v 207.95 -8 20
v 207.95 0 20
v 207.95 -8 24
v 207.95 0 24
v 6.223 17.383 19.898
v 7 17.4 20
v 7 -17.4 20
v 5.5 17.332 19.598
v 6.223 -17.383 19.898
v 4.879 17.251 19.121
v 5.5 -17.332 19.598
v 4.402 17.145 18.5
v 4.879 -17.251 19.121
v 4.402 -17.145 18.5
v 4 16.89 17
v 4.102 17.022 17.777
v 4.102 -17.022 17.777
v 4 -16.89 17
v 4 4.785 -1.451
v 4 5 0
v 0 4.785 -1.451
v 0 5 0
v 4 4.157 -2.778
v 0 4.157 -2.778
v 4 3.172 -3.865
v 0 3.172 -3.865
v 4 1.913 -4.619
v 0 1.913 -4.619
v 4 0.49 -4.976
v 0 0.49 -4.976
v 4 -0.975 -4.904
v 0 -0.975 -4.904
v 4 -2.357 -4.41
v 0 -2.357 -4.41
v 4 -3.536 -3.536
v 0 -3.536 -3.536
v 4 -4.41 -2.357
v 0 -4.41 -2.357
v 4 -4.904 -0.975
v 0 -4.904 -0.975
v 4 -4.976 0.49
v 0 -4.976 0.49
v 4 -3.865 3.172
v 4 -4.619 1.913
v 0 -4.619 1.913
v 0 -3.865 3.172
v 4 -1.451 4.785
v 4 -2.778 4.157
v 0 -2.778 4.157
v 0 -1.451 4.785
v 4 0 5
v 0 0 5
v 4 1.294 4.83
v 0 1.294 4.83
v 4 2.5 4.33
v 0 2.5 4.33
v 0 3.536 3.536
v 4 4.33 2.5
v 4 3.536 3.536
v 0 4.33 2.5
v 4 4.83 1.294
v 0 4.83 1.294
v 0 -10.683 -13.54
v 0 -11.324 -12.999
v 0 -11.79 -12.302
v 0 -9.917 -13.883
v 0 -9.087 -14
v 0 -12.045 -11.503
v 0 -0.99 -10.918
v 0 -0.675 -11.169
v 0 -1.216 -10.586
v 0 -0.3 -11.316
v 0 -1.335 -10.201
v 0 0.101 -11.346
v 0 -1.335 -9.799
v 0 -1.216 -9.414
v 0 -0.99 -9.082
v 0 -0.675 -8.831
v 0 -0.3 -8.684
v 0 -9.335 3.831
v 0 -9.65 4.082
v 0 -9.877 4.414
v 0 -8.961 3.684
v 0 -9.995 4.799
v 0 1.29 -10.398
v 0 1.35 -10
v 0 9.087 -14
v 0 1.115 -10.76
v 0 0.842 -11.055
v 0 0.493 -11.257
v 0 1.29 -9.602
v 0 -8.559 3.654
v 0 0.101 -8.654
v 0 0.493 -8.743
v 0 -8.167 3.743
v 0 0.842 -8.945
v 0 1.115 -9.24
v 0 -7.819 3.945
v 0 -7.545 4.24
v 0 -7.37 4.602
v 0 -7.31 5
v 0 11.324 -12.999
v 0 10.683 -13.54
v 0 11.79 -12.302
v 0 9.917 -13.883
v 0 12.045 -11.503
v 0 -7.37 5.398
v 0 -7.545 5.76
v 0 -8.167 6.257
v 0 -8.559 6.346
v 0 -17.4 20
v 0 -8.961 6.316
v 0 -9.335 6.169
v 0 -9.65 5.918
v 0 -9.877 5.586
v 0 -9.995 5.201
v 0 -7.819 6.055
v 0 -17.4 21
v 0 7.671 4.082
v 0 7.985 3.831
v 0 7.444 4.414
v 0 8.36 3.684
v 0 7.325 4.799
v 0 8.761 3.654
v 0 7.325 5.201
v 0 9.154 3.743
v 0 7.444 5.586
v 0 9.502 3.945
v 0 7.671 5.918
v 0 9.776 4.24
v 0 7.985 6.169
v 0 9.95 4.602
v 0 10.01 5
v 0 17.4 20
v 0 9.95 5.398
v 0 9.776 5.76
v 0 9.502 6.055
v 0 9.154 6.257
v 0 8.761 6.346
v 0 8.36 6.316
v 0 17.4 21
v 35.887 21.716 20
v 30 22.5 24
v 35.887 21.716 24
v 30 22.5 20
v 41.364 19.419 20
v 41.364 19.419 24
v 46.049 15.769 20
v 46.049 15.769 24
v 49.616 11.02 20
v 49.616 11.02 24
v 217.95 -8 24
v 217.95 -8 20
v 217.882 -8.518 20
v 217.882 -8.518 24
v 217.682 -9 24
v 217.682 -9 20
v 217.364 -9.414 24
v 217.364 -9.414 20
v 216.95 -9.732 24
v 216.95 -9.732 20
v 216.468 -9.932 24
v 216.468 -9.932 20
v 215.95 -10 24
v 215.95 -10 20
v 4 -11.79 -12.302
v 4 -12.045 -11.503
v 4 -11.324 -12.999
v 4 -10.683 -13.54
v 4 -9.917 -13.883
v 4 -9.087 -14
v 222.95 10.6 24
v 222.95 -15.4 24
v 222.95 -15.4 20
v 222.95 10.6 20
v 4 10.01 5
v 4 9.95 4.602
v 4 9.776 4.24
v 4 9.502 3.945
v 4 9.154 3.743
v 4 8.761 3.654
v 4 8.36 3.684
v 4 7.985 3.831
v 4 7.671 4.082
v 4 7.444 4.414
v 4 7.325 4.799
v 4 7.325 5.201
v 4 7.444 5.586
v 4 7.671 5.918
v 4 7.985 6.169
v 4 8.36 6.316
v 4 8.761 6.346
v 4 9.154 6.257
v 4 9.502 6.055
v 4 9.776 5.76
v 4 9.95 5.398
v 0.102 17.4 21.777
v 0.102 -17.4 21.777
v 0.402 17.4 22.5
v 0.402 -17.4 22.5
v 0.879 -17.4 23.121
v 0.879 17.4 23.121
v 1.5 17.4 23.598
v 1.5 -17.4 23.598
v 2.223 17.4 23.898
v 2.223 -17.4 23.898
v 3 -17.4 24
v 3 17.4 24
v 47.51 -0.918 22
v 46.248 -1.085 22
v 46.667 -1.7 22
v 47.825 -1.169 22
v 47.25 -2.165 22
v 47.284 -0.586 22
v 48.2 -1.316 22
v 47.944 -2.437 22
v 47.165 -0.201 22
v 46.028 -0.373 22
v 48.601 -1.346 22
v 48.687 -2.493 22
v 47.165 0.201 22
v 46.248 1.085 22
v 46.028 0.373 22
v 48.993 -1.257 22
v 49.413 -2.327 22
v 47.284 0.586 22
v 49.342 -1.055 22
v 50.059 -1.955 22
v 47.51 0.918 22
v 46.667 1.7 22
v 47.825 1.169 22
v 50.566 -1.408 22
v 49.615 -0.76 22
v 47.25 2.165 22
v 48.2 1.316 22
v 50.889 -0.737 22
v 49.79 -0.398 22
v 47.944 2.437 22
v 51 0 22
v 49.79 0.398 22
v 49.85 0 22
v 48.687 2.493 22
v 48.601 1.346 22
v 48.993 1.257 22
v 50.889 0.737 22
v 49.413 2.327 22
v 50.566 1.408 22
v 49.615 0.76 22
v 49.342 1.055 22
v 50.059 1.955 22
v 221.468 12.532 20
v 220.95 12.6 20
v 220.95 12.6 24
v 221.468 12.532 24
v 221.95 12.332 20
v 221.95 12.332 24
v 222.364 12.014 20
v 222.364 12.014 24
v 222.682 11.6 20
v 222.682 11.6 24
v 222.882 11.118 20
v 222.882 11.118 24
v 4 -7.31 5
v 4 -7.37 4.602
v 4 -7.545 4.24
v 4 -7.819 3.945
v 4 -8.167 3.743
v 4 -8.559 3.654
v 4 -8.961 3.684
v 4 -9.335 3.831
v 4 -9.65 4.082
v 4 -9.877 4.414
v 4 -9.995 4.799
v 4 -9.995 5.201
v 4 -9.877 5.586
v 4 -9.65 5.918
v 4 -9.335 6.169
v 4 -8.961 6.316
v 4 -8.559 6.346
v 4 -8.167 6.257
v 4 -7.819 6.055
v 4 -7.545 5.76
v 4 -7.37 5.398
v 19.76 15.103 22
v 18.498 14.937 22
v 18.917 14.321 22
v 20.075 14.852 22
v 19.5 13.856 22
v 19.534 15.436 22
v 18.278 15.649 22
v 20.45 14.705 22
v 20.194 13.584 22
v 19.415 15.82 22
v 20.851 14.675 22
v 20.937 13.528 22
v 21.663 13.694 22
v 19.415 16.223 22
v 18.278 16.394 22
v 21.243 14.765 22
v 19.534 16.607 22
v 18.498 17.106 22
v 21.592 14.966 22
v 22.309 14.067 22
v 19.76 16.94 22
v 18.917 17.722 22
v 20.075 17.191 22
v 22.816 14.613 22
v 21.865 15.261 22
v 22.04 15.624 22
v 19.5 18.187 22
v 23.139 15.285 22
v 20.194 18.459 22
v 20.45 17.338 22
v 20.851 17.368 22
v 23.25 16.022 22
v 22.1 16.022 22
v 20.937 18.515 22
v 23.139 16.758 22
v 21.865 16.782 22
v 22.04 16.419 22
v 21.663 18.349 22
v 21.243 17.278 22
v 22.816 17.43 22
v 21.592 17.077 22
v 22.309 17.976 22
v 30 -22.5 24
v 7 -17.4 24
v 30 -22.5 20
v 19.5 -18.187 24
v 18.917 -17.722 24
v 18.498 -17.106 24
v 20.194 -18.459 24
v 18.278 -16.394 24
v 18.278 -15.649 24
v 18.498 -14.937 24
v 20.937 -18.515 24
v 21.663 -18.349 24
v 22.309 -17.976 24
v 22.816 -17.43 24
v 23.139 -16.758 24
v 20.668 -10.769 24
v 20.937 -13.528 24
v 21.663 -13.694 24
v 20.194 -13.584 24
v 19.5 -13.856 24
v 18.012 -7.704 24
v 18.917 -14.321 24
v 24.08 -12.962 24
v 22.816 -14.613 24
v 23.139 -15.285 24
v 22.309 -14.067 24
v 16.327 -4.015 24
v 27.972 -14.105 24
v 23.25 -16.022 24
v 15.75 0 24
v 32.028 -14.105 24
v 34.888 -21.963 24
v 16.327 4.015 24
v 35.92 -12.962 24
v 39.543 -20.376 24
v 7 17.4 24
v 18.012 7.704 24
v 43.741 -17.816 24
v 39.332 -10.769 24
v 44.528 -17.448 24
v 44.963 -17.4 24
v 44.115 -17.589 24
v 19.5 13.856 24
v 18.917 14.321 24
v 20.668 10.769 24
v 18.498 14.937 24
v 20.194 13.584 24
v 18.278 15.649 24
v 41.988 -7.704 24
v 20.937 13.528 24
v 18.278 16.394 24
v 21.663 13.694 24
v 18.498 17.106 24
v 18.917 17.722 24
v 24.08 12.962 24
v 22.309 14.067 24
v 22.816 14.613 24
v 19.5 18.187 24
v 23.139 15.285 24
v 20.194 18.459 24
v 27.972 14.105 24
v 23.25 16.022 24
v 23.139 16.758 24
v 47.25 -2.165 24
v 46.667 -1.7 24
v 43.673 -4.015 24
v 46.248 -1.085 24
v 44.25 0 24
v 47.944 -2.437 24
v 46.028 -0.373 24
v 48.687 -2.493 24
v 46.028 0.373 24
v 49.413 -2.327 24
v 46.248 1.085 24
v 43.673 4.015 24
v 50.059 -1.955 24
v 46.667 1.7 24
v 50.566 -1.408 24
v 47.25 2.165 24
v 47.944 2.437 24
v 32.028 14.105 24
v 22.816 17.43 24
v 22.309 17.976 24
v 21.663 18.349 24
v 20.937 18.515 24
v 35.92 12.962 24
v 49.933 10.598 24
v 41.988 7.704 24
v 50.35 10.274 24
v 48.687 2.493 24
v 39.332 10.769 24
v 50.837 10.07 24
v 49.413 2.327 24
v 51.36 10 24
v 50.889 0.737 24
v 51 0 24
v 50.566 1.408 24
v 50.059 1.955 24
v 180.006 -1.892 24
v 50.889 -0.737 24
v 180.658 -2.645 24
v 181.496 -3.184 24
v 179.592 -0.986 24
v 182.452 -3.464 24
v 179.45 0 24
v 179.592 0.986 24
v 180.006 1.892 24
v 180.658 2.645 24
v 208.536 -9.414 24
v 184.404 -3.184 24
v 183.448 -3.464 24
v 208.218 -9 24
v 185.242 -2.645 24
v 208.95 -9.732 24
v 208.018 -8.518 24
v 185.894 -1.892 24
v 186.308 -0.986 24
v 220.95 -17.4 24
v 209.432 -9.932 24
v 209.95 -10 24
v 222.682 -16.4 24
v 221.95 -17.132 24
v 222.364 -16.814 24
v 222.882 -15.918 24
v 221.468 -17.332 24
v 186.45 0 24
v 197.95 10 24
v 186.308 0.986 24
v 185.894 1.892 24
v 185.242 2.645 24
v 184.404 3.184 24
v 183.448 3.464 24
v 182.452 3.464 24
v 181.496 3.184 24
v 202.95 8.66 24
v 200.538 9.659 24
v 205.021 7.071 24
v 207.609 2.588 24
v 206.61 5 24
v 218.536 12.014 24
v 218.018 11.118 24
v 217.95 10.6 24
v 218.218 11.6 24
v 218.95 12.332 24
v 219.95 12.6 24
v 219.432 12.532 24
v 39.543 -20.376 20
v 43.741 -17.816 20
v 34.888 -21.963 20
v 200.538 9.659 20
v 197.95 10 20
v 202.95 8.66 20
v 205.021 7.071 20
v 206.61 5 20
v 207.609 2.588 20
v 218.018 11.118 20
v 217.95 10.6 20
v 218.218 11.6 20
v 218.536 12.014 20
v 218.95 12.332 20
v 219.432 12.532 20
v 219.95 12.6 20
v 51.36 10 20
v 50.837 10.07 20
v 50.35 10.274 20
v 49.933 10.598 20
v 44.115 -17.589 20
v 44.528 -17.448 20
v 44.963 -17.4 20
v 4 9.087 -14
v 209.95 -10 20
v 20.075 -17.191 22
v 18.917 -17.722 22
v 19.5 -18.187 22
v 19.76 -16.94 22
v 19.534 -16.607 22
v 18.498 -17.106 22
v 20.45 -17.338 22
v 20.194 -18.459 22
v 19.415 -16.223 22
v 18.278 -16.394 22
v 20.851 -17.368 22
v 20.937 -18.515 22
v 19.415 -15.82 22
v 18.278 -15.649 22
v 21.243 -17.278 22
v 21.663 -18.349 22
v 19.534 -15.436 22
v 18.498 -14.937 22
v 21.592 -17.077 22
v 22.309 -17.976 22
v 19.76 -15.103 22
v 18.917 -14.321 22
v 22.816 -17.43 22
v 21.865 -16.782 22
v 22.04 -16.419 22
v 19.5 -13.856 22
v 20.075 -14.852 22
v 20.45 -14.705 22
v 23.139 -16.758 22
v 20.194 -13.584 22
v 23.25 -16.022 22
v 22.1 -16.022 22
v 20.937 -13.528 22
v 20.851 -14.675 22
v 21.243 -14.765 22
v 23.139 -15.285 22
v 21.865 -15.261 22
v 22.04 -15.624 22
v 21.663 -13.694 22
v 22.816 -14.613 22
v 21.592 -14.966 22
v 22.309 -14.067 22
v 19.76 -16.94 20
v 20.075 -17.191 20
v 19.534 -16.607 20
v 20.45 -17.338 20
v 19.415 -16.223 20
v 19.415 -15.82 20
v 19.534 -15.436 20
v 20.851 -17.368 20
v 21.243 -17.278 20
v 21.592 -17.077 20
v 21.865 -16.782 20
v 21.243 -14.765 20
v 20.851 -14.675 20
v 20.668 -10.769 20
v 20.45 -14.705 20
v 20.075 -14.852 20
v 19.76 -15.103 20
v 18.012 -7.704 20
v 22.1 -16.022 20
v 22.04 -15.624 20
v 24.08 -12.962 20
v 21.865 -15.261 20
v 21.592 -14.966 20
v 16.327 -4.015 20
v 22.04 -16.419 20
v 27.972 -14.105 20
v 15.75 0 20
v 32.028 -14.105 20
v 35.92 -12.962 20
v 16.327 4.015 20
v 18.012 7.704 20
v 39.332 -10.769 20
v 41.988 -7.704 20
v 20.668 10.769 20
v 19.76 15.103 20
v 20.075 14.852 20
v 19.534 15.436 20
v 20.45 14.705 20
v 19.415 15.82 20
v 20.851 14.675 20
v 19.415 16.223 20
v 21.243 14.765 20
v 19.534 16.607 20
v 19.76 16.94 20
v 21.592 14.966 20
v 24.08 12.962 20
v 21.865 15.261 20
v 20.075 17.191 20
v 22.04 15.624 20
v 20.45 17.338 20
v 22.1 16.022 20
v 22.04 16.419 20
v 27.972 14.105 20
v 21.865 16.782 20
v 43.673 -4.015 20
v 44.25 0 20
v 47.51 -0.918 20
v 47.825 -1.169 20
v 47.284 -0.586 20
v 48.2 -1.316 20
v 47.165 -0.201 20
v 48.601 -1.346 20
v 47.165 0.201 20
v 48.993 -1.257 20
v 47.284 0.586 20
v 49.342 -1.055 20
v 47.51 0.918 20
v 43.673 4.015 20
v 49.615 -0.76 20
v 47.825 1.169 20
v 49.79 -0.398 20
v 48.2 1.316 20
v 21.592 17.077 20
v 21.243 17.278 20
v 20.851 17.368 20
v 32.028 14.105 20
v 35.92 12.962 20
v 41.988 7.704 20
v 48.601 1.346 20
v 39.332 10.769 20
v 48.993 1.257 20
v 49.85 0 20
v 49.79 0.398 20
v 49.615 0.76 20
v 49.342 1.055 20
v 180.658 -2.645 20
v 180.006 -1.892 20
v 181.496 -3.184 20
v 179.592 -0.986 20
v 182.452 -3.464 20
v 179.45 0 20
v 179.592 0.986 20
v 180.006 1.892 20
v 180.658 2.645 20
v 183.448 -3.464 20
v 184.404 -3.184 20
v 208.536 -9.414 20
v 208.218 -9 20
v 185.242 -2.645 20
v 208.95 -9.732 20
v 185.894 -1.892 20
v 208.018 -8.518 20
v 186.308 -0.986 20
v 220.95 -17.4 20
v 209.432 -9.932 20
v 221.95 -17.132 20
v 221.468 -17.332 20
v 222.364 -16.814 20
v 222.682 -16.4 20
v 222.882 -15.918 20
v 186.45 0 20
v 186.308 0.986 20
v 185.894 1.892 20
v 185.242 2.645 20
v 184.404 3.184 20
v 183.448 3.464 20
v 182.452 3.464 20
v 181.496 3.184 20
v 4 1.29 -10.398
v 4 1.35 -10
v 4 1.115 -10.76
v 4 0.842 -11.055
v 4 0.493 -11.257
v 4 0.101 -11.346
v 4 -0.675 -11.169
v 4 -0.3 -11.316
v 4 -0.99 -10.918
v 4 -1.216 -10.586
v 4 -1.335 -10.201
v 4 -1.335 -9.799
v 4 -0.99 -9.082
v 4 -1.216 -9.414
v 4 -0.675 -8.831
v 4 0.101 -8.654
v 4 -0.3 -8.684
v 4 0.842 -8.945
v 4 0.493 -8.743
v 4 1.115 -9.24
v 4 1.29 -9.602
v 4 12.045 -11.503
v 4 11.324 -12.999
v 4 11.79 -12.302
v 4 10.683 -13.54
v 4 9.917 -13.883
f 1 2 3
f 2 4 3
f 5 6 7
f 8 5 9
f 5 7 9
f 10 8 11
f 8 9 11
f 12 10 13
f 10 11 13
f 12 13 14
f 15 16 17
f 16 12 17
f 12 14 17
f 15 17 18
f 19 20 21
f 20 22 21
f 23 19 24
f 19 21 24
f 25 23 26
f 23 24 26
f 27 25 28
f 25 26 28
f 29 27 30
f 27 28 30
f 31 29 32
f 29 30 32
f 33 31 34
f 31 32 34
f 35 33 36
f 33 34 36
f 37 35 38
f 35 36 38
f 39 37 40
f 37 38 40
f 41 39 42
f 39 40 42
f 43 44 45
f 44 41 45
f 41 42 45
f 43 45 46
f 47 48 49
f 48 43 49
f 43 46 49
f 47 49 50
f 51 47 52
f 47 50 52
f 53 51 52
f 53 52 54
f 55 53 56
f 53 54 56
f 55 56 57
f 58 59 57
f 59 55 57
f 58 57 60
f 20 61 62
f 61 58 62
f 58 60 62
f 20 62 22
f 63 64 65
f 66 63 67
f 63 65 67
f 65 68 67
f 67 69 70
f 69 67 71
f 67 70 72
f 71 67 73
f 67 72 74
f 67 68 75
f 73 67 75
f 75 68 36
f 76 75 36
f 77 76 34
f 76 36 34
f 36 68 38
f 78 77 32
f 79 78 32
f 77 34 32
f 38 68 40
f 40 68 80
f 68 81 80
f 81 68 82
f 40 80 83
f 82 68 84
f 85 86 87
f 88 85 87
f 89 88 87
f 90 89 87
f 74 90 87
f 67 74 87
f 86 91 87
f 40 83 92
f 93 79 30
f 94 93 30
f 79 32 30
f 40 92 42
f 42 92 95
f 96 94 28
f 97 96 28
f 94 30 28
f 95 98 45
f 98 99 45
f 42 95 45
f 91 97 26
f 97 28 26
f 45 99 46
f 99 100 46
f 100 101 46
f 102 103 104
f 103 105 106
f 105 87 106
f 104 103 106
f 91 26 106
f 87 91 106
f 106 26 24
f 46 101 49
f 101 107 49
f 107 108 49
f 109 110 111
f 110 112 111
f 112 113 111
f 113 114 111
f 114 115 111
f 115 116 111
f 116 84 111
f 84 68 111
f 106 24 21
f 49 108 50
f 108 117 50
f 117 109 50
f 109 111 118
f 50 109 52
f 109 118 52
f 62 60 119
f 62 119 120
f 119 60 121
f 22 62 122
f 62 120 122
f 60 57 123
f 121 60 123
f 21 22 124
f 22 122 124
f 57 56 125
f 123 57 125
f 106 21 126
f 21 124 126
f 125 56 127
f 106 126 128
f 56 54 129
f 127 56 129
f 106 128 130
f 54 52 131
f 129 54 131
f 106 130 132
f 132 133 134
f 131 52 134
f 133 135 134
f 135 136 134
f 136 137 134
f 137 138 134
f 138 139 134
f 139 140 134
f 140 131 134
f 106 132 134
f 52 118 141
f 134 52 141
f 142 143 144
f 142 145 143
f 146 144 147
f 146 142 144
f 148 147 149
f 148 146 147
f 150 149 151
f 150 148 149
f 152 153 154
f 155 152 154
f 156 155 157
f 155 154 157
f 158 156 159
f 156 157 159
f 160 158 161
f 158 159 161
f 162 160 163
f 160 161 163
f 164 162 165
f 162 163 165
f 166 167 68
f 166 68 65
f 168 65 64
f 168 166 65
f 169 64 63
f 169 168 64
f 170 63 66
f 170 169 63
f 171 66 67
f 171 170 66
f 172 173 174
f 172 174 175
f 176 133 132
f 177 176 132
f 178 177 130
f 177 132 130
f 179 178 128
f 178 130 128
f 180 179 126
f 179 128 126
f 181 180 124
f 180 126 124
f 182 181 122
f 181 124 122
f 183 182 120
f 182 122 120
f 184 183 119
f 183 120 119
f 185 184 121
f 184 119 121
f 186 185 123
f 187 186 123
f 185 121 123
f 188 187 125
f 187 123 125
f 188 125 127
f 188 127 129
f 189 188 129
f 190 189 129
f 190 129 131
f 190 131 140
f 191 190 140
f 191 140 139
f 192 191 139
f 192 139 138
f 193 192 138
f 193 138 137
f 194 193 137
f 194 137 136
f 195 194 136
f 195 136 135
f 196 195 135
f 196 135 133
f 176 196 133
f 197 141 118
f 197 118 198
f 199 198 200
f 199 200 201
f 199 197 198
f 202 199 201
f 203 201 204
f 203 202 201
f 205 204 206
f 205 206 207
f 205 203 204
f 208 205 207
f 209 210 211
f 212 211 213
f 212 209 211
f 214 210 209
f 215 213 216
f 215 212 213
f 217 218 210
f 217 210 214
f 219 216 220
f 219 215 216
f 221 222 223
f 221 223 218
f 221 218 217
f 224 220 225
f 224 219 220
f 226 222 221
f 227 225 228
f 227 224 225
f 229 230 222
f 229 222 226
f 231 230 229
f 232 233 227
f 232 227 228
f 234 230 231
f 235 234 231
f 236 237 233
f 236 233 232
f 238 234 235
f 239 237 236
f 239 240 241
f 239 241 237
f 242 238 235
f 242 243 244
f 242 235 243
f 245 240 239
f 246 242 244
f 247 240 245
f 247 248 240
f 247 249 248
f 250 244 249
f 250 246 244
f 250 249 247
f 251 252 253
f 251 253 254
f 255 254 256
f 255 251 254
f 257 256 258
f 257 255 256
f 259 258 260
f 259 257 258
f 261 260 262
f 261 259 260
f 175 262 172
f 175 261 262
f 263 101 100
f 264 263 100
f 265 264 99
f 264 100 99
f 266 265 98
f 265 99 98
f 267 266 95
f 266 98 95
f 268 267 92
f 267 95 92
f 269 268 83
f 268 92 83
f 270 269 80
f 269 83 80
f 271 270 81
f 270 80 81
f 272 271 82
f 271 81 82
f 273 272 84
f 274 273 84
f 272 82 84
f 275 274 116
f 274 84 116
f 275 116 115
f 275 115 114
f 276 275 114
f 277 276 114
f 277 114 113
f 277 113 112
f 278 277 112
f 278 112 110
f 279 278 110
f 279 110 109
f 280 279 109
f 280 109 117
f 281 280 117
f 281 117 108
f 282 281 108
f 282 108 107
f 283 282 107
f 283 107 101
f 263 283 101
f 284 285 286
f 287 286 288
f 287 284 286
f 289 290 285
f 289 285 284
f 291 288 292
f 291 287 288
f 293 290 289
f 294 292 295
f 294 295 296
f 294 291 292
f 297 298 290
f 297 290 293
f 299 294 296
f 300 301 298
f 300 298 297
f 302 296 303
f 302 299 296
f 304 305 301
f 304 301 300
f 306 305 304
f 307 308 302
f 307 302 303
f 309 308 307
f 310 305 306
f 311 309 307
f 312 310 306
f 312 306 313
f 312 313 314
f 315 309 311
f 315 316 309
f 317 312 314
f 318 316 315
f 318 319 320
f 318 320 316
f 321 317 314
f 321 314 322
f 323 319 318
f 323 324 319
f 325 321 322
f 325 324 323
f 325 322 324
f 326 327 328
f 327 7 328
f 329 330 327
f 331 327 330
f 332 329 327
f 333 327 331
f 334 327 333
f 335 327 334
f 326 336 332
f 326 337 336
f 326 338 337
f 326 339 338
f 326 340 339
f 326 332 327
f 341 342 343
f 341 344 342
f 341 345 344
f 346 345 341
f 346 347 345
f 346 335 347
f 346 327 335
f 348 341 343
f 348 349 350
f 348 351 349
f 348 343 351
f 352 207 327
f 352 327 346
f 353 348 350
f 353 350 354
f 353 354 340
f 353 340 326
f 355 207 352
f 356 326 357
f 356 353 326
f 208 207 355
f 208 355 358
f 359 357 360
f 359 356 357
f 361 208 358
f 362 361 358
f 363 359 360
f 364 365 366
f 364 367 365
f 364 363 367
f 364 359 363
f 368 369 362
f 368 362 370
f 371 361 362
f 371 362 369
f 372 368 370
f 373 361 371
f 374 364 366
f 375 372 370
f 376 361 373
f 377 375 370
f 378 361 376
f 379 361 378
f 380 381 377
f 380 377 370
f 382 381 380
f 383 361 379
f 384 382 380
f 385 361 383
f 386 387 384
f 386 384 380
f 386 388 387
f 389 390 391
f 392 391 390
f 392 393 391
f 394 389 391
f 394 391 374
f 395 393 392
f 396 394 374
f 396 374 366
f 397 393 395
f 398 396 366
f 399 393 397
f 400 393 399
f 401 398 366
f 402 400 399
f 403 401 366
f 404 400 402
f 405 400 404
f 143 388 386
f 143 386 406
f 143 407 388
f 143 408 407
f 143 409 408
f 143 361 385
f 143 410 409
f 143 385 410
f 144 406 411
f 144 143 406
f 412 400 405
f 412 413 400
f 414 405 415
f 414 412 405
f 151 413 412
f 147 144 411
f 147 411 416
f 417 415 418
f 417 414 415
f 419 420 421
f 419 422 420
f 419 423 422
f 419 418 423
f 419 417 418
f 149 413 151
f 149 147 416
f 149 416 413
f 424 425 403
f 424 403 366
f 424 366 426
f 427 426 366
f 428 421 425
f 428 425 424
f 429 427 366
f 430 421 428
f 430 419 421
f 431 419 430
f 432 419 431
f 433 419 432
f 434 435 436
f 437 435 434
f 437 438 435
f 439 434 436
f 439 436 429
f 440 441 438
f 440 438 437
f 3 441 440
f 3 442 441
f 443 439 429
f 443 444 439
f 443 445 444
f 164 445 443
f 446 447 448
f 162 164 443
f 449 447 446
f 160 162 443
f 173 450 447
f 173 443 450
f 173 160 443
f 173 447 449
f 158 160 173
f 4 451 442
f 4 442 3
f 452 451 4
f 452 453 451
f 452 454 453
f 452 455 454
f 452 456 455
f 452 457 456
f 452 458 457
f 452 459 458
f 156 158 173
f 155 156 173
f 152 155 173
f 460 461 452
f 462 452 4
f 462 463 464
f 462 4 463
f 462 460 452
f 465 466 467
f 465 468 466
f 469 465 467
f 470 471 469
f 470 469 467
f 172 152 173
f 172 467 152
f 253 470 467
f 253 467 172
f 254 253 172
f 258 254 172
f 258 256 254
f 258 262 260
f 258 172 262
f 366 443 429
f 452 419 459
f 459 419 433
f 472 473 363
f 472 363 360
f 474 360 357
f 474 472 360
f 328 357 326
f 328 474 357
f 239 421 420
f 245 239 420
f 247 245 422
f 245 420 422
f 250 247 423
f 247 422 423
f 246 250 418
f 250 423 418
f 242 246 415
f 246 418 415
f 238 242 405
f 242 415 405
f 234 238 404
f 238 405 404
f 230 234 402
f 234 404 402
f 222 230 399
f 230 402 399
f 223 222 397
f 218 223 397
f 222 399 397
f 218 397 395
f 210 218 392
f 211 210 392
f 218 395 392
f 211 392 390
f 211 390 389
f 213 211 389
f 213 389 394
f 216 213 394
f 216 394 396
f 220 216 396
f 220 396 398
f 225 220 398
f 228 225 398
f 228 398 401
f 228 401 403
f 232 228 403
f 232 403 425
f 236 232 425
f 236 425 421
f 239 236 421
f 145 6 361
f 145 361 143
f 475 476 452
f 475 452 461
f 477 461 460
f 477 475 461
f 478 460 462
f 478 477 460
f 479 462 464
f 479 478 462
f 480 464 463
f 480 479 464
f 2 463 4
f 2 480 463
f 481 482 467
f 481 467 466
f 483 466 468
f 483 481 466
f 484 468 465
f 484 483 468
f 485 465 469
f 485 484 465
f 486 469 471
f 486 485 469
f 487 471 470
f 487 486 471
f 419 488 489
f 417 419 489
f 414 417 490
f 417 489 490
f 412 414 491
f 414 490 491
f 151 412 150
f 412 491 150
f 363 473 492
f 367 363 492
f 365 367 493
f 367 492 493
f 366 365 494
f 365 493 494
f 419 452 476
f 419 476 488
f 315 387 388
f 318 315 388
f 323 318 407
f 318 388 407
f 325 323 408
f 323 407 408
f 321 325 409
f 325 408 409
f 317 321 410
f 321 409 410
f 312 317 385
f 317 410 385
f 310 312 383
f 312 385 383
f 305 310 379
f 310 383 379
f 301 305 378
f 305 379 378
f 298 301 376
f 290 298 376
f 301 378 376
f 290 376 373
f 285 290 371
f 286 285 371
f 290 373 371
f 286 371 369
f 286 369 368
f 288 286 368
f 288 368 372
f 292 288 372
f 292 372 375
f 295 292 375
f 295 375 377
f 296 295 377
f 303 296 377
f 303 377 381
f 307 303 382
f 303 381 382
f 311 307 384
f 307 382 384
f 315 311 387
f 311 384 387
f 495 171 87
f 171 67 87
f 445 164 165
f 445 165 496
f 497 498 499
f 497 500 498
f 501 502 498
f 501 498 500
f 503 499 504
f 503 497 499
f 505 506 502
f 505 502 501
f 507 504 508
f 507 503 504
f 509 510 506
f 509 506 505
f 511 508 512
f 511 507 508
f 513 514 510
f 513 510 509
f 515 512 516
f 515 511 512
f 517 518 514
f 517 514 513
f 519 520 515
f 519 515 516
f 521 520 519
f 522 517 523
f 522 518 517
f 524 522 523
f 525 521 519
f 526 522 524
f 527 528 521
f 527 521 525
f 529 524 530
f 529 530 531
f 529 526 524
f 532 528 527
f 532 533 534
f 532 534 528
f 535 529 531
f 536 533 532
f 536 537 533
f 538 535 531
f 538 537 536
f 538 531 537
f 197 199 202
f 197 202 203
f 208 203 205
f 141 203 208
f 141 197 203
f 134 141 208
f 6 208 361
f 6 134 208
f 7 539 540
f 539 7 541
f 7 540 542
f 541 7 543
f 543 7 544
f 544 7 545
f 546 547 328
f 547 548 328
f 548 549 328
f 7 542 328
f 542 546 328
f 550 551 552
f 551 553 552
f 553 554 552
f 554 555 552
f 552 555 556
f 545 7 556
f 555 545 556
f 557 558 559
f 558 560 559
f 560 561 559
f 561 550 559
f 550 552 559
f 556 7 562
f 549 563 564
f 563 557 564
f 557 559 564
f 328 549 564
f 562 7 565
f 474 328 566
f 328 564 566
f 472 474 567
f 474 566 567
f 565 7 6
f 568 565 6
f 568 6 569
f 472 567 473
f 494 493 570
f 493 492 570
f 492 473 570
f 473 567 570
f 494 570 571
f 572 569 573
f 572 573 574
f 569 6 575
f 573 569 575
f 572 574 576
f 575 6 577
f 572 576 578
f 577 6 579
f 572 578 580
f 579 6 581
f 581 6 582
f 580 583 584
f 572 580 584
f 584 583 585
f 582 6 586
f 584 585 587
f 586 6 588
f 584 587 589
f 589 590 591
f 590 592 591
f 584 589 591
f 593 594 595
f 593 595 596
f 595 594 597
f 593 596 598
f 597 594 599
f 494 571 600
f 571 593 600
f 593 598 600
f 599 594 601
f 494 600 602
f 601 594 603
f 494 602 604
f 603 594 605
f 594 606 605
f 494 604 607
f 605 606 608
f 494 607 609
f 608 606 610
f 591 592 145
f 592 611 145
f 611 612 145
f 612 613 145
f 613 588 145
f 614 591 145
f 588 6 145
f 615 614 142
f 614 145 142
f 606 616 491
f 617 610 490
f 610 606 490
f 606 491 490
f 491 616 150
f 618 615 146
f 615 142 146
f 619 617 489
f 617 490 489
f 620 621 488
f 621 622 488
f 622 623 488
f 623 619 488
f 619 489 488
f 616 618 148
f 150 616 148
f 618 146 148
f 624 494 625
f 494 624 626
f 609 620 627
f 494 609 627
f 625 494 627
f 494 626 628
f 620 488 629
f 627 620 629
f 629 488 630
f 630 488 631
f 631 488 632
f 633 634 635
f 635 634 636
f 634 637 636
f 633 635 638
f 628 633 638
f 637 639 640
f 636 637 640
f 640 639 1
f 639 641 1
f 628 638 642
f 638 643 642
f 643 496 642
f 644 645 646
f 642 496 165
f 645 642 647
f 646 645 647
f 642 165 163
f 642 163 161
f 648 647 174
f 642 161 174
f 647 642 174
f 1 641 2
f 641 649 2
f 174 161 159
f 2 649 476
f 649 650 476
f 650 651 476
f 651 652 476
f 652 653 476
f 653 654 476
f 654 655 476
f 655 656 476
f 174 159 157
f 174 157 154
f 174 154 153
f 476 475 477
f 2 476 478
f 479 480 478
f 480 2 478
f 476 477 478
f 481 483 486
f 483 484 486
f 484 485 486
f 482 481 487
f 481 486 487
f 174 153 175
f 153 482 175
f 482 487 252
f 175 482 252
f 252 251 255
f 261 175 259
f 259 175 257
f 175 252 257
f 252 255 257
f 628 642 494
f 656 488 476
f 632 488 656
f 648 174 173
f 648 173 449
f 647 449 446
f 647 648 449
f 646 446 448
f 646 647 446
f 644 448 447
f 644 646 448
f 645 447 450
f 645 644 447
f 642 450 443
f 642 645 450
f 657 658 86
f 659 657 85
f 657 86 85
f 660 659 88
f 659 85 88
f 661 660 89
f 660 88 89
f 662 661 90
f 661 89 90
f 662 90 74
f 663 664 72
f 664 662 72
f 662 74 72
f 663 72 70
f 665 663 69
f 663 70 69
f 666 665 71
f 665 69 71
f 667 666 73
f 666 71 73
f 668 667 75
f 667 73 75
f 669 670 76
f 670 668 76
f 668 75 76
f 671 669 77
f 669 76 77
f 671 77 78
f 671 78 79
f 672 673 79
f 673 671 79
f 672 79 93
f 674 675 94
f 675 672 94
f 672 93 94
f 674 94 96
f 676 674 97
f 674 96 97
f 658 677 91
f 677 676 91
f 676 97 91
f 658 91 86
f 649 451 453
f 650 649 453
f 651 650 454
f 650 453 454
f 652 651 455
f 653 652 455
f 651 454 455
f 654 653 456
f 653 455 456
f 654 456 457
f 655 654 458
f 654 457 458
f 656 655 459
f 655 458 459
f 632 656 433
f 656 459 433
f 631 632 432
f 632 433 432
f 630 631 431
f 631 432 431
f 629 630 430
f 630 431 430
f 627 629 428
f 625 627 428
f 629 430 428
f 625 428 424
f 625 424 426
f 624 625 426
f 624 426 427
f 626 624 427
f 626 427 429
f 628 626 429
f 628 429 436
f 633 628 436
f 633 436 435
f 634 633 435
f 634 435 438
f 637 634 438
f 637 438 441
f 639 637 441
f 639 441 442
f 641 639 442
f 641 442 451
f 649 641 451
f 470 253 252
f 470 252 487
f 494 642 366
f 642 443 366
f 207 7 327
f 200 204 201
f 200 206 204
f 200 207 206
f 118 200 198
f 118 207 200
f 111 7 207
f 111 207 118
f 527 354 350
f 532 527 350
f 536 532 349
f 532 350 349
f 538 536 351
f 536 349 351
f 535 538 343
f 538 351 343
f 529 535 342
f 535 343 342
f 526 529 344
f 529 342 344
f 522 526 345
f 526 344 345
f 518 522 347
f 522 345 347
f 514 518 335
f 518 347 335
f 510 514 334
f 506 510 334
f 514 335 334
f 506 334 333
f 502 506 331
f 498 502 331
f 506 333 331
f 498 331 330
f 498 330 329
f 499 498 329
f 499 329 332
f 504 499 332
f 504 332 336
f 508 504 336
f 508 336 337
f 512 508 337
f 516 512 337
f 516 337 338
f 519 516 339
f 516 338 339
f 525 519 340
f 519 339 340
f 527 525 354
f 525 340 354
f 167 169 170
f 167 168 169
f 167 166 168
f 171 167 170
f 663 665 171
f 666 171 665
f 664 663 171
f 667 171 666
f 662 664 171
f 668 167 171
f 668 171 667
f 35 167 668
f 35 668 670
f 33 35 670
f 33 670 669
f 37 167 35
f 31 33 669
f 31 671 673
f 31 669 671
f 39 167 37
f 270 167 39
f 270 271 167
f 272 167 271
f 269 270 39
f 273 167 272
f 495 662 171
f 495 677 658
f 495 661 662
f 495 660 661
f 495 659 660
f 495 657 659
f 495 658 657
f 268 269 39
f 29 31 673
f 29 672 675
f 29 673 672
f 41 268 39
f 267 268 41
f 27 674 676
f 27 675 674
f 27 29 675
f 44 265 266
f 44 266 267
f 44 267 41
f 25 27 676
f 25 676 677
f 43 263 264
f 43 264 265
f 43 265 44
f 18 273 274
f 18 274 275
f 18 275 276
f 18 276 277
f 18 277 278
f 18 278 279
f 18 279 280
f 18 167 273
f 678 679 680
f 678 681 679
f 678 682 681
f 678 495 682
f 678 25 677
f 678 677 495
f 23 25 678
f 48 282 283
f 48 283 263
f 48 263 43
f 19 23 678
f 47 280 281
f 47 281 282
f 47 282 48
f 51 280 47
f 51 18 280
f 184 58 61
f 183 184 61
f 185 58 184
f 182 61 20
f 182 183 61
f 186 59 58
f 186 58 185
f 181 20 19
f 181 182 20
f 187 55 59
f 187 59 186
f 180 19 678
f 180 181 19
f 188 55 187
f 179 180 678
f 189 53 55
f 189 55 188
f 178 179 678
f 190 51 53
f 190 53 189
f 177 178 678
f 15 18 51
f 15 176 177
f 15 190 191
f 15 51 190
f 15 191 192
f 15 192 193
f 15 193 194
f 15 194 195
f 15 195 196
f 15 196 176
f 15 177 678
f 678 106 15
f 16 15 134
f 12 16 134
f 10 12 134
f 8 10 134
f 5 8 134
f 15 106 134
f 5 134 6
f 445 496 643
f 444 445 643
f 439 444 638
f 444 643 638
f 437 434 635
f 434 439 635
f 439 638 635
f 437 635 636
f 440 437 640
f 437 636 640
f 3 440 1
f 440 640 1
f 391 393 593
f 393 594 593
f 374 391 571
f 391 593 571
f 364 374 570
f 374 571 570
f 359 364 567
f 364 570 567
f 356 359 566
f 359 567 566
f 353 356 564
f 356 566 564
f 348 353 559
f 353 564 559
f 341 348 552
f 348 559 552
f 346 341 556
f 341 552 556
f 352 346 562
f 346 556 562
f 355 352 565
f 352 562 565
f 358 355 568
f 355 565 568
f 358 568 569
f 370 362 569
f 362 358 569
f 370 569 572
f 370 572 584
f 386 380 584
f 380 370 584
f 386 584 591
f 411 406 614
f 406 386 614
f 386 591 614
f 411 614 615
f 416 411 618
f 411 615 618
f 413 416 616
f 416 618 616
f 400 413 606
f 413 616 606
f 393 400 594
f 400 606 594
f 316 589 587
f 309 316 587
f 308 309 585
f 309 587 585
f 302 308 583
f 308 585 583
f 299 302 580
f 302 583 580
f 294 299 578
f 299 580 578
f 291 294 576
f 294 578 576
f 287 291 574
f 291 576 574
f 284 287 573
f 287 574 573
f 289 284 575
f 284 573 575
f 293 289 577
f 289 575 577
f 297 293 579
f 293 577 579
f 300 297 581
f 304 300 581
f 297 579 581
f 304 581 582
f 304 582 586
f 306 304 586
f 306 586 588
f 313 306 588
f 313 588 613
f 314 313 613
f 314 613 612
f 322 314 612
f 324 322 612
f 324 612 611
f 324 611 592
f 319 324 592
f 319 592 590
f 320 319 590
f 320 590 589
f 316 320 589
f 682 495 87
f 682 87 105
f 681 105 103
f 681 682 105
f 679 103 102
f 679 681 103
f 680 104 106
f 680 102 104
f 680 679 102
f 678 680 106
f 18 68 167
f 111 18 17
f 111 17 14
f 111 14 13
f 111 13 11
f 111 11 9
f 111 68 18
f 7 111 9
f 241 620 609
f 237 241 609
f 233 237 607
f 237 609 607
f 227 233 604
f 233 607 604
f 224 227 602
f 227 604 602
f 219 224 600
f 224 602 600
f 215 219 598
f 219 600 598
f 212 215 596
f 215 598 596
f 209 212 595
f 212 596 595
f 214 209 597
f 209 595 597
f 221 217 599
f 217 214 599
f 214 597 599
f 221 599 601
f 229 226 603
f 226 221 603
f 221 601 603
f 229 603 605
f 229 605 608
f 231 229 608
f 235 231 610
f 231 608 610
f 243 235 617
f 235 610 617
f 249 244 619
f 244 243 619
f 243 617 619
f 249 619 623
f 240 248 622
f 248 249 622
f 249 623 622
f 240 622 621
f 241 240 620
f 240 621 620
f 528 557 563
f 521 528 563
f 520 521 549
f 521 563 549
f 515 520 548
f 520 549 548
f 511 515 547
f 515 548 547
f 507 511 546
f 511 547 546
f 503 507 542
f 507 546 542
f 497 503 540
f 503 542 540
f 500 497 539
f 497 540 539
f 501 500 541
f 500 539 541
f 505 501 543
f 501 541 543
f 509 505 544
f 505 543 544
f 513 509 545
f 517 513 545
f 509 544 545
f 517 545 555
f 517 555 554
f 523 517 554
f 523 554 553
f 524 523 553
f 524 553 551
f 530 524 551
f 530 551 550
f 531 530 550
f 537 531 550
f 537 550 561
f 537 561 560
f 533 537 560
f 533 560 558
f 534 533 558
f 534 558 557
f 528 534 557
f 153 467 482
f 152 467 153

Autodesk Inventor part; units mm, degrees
ref_plane "YZ Plane" through (0, 0, 0) normal (1, 0, 0) x (0, 1, 0)
ref_plane "XZ Plane" through (0, 0, 0) normal (0, 1, 0) x (-1, 0, 0)
ref_plane "XY Plane" through (0, 0, 0) normal (0, 0, 1) x (1, 0, 0)
sketch "スケッチ1" plane through (0, 0, 0) normal (1, 0, 0) x (0, 1, 0)
  circle A0 centre (0, 0) radius 10
  circle A1 centre (0, -10) radius 1.35
  circle A2 centre (8.6603, 5) radius 1.35
  circle A3 centre (-8.6603, 5) radius 1.35
  circle A4 centre (0, 0) radius 5
  line L0 (0, 0) -> (0, 50)
  circle A5 centre (0, 50) radius 22.5
  circle A6 centre (0, 0) radius 14
  line L1 (-14, 0) -> (-22.5, 50)
  line L2 (14, 0) -> (22.5, 50)
  line L3 (0, -14) -> (-11.62, -14)
  line L4 (-11.62, -14) -> (-14, 0)
  line L5 (0, -14) -> (11.62, -14)
  line L6 (11.62, -14) -> (14, 0)
  line L7 (0, 20) -> (-17.4, 20)
  line L8 (0, 20) -> (17.4, 20)
  dimension "d0" = 20
  dimension "d1" = 2.7
  dimension "d4" = 360
  dimension "d6" = 10
  dimension "d7" = 50
  dimension "d8" = 45
  dimension "d9" = 28
extrude "押し出し1" add sketch "スケッチ1" along normal blind 4 contours A0 A1 A3 A2 | A6 L6 L4 | A6 L1 L7 L0 | L0 L8 L2 A6 | L6 L5 A6 | A6 L3 L4
sketch "スケッチ2" plane through (0, -17.4, 20) normal (0, 0, 1) x (1, 0, 0)
  line L0 (0, 17.4) -> (30, 17.4)
  circle A0 centre (30, 17.4) radius 22.5
  circle A1 centre (30, 17.4) radius 18.5
  circle A2 centre (30, 17.4) radius 14.25
  circle A3 centre (48.5, 17.4) radius 1.35
  circle A4 centre (20.75, 33.4215) radius 1.35
  circle A5 centre (20.75, 1.3785) radius 1.35
  line L1 (0, 29.02) -> (0, 34.8) projected
  line L2 (0, 0) -> (0, 5.78) projected
  line L3 (0, 34.8) -> (0, 0)
  line L4 (4, 29.02) -> (4, 34.8) projected
  line L5 (4, 34.8) -> (7, 34.8)
  line L6 (7, 34.8) -> (30, 39.9)
  line L7 (4, 0) -> (4, 5.78) projected
  line L8 (4, 0) -> (7, 0)
  line L9 (7, 0) -> (30, -5.1)
  line L10 (4, 0) -> (0, 0)
  line L11 (0, 34.8) -> (4, 34.8) projected
  line L12 (0, 0) -> (0, 34.8)
  line L13 (0, 34.8) -> (4, 34.8)
  dimension "d14" = 37
  dimension "d12" = 30
  dimension "d13" = 45
  dimension "d15" = 28.5
  dimension "d16" = 2.7
  dimension "d19" = 360
  dimension "d21" = 3
  dimension "d22" = 3
extrude "押し出し2" add sketch "スケッチ2" along normal blind 4 contours L3 L1 L11 L5 L6 A0 L0 | L0 A0 L9 L8 L10 L2 L3 | A1 A4 A3 A5 | A0 L6 L9
fillet "フィレット1" radius 3 2 edges at (4, 0, 20) (0, 0, 24)
fillet "フィレット2" radius 3 2 edges at (2, -11.62, -14) (2, 11.62, -14)
sketch "スケッチ7" plane through (0, -17.4, 24) normal (0, 0, 1) x (1, 0, 0)
  circle A0 centre (30, 17.4) radius 14.25 projected
  line L0 (30, 17.4) -> (182.95, 17.4)
  line L1 (30, 17.4) -> (182.95, 17.4) construction
  circle A1 centre (182.95, 17.4) radius 3.5
  circle A2 centre (182.95, 17.4) radius 10
  line L2 (182.95, 27.4) -> (50.1556, 27.4)
  arc A3 (30, -5.1) -> (30, 39.9) centre (30, 17.4) ccw projected
  line L3 (182.95, 27.4) -> (315.7444, 27.4) construction
  line L4 (182.95, 7.4) -> (50.1556, 7.4)
  point P0 (0, 17.4)
  dimension "d55" = 152.95
  dimension "d56" = 0
  dimension "d57" = 7
  dimension "d58" = 20
  dimension "d59" = 180
extrude "押し出し7" add sketch "スケッチ7" against normal blind 4 contours A3 L2 A2 L0 | L0 A2 L4 A3 | A2
sketch "スケッチ8" plane through (0, -17.4, 24) normal (0, 0, 1) x (1, 0, 0)
  circle A0 centre (20.75, 33.4215) radius 1.35 projected
  circle A1 centre (20.75, 33.4215) radius 2.5
  circle A2 centre (48.5, 17.4) radius 1.35 projected
  circle A3 centre (48.5, 17.4) radius 2.5
  circle A4 centre (20.75, 1.3785) radius 1.35 projected
  circle A5 centre (20.75, 1.3785) radius 2.5
  point P0 (0, 17.4)
  dimension "d63" = 5
  dimension "d64" = 5
  dimension "d65" = 5
extrude "押し出し8" cut sketch "スケッチ8" against normal blind 2 contours A0 | A1 | A3 | A4 | A5
fillet "フィレット4" radius 2 1 edges at (50.1556, 10, 22)
sketch "スケッチ10" plane through (0, -17.4, 24) normal (0, 0, 1) x (1, 0, 0)
  arc A0 (182.95, 7.4) -> (182.95, 27.4) centre (182.95, 17.4) ccw projected
  line L0 (182.95, 27.4) -> (207.95, 27.4)
  line L1 (207.95, 0) -> (44.265, 0)
  arc A1 (30, -5.1) -> (50.1556, 7.4) centre (30, 17.4) ccw projected
  line L2 (207.95, 27.4) -> (207.95, 0)
  line L3 (207.95, 0) -> (222.95, 0)
  line L4 (222.95, 0) -> (222.95, 30)
  line L5 (222.95, 30) -> (217.95, 30)
  line L6 (217.95, 30) -> (217.95, 7.4)
  line L7 (217.95, 7.4) -> (207.95, 7.4)
  circle A2 centre (182.95, 17.4) radius 3.5 projected
  circle A3 centre (182.95, 17.4) radius 10
  circle A4 centre (30, 17.4) radius 22.5
  line L8 (50.1556, 7.4) -> (182.95, 7.4)
  point P0 (0, 17.4)
  dimension "d75" = 25
  dimension "d76" = 15
  dimension "d77" = 30
  dimension "d78" = 5
extrude "押し出し10" add sketch "スケッチ10" against normal blind 4 contours A0 L0 L2 L1 A1 L8 | L7 L6 L5 L4 L3 L2
fillet "フィレット5" radius 10 1 edges at (207.95, 10, 22)
fillet "フィレット6" radius 2 6 edges at (217.95, 12.6, 22) (222.95, 12.6, 22) (217.95, -10, 22) (207.95, -10, 22) (222.95, -17.4, 22) (44.265, -17.4, 22)
properties part number "motor_holder_2" material "アルミニウム 6061"
